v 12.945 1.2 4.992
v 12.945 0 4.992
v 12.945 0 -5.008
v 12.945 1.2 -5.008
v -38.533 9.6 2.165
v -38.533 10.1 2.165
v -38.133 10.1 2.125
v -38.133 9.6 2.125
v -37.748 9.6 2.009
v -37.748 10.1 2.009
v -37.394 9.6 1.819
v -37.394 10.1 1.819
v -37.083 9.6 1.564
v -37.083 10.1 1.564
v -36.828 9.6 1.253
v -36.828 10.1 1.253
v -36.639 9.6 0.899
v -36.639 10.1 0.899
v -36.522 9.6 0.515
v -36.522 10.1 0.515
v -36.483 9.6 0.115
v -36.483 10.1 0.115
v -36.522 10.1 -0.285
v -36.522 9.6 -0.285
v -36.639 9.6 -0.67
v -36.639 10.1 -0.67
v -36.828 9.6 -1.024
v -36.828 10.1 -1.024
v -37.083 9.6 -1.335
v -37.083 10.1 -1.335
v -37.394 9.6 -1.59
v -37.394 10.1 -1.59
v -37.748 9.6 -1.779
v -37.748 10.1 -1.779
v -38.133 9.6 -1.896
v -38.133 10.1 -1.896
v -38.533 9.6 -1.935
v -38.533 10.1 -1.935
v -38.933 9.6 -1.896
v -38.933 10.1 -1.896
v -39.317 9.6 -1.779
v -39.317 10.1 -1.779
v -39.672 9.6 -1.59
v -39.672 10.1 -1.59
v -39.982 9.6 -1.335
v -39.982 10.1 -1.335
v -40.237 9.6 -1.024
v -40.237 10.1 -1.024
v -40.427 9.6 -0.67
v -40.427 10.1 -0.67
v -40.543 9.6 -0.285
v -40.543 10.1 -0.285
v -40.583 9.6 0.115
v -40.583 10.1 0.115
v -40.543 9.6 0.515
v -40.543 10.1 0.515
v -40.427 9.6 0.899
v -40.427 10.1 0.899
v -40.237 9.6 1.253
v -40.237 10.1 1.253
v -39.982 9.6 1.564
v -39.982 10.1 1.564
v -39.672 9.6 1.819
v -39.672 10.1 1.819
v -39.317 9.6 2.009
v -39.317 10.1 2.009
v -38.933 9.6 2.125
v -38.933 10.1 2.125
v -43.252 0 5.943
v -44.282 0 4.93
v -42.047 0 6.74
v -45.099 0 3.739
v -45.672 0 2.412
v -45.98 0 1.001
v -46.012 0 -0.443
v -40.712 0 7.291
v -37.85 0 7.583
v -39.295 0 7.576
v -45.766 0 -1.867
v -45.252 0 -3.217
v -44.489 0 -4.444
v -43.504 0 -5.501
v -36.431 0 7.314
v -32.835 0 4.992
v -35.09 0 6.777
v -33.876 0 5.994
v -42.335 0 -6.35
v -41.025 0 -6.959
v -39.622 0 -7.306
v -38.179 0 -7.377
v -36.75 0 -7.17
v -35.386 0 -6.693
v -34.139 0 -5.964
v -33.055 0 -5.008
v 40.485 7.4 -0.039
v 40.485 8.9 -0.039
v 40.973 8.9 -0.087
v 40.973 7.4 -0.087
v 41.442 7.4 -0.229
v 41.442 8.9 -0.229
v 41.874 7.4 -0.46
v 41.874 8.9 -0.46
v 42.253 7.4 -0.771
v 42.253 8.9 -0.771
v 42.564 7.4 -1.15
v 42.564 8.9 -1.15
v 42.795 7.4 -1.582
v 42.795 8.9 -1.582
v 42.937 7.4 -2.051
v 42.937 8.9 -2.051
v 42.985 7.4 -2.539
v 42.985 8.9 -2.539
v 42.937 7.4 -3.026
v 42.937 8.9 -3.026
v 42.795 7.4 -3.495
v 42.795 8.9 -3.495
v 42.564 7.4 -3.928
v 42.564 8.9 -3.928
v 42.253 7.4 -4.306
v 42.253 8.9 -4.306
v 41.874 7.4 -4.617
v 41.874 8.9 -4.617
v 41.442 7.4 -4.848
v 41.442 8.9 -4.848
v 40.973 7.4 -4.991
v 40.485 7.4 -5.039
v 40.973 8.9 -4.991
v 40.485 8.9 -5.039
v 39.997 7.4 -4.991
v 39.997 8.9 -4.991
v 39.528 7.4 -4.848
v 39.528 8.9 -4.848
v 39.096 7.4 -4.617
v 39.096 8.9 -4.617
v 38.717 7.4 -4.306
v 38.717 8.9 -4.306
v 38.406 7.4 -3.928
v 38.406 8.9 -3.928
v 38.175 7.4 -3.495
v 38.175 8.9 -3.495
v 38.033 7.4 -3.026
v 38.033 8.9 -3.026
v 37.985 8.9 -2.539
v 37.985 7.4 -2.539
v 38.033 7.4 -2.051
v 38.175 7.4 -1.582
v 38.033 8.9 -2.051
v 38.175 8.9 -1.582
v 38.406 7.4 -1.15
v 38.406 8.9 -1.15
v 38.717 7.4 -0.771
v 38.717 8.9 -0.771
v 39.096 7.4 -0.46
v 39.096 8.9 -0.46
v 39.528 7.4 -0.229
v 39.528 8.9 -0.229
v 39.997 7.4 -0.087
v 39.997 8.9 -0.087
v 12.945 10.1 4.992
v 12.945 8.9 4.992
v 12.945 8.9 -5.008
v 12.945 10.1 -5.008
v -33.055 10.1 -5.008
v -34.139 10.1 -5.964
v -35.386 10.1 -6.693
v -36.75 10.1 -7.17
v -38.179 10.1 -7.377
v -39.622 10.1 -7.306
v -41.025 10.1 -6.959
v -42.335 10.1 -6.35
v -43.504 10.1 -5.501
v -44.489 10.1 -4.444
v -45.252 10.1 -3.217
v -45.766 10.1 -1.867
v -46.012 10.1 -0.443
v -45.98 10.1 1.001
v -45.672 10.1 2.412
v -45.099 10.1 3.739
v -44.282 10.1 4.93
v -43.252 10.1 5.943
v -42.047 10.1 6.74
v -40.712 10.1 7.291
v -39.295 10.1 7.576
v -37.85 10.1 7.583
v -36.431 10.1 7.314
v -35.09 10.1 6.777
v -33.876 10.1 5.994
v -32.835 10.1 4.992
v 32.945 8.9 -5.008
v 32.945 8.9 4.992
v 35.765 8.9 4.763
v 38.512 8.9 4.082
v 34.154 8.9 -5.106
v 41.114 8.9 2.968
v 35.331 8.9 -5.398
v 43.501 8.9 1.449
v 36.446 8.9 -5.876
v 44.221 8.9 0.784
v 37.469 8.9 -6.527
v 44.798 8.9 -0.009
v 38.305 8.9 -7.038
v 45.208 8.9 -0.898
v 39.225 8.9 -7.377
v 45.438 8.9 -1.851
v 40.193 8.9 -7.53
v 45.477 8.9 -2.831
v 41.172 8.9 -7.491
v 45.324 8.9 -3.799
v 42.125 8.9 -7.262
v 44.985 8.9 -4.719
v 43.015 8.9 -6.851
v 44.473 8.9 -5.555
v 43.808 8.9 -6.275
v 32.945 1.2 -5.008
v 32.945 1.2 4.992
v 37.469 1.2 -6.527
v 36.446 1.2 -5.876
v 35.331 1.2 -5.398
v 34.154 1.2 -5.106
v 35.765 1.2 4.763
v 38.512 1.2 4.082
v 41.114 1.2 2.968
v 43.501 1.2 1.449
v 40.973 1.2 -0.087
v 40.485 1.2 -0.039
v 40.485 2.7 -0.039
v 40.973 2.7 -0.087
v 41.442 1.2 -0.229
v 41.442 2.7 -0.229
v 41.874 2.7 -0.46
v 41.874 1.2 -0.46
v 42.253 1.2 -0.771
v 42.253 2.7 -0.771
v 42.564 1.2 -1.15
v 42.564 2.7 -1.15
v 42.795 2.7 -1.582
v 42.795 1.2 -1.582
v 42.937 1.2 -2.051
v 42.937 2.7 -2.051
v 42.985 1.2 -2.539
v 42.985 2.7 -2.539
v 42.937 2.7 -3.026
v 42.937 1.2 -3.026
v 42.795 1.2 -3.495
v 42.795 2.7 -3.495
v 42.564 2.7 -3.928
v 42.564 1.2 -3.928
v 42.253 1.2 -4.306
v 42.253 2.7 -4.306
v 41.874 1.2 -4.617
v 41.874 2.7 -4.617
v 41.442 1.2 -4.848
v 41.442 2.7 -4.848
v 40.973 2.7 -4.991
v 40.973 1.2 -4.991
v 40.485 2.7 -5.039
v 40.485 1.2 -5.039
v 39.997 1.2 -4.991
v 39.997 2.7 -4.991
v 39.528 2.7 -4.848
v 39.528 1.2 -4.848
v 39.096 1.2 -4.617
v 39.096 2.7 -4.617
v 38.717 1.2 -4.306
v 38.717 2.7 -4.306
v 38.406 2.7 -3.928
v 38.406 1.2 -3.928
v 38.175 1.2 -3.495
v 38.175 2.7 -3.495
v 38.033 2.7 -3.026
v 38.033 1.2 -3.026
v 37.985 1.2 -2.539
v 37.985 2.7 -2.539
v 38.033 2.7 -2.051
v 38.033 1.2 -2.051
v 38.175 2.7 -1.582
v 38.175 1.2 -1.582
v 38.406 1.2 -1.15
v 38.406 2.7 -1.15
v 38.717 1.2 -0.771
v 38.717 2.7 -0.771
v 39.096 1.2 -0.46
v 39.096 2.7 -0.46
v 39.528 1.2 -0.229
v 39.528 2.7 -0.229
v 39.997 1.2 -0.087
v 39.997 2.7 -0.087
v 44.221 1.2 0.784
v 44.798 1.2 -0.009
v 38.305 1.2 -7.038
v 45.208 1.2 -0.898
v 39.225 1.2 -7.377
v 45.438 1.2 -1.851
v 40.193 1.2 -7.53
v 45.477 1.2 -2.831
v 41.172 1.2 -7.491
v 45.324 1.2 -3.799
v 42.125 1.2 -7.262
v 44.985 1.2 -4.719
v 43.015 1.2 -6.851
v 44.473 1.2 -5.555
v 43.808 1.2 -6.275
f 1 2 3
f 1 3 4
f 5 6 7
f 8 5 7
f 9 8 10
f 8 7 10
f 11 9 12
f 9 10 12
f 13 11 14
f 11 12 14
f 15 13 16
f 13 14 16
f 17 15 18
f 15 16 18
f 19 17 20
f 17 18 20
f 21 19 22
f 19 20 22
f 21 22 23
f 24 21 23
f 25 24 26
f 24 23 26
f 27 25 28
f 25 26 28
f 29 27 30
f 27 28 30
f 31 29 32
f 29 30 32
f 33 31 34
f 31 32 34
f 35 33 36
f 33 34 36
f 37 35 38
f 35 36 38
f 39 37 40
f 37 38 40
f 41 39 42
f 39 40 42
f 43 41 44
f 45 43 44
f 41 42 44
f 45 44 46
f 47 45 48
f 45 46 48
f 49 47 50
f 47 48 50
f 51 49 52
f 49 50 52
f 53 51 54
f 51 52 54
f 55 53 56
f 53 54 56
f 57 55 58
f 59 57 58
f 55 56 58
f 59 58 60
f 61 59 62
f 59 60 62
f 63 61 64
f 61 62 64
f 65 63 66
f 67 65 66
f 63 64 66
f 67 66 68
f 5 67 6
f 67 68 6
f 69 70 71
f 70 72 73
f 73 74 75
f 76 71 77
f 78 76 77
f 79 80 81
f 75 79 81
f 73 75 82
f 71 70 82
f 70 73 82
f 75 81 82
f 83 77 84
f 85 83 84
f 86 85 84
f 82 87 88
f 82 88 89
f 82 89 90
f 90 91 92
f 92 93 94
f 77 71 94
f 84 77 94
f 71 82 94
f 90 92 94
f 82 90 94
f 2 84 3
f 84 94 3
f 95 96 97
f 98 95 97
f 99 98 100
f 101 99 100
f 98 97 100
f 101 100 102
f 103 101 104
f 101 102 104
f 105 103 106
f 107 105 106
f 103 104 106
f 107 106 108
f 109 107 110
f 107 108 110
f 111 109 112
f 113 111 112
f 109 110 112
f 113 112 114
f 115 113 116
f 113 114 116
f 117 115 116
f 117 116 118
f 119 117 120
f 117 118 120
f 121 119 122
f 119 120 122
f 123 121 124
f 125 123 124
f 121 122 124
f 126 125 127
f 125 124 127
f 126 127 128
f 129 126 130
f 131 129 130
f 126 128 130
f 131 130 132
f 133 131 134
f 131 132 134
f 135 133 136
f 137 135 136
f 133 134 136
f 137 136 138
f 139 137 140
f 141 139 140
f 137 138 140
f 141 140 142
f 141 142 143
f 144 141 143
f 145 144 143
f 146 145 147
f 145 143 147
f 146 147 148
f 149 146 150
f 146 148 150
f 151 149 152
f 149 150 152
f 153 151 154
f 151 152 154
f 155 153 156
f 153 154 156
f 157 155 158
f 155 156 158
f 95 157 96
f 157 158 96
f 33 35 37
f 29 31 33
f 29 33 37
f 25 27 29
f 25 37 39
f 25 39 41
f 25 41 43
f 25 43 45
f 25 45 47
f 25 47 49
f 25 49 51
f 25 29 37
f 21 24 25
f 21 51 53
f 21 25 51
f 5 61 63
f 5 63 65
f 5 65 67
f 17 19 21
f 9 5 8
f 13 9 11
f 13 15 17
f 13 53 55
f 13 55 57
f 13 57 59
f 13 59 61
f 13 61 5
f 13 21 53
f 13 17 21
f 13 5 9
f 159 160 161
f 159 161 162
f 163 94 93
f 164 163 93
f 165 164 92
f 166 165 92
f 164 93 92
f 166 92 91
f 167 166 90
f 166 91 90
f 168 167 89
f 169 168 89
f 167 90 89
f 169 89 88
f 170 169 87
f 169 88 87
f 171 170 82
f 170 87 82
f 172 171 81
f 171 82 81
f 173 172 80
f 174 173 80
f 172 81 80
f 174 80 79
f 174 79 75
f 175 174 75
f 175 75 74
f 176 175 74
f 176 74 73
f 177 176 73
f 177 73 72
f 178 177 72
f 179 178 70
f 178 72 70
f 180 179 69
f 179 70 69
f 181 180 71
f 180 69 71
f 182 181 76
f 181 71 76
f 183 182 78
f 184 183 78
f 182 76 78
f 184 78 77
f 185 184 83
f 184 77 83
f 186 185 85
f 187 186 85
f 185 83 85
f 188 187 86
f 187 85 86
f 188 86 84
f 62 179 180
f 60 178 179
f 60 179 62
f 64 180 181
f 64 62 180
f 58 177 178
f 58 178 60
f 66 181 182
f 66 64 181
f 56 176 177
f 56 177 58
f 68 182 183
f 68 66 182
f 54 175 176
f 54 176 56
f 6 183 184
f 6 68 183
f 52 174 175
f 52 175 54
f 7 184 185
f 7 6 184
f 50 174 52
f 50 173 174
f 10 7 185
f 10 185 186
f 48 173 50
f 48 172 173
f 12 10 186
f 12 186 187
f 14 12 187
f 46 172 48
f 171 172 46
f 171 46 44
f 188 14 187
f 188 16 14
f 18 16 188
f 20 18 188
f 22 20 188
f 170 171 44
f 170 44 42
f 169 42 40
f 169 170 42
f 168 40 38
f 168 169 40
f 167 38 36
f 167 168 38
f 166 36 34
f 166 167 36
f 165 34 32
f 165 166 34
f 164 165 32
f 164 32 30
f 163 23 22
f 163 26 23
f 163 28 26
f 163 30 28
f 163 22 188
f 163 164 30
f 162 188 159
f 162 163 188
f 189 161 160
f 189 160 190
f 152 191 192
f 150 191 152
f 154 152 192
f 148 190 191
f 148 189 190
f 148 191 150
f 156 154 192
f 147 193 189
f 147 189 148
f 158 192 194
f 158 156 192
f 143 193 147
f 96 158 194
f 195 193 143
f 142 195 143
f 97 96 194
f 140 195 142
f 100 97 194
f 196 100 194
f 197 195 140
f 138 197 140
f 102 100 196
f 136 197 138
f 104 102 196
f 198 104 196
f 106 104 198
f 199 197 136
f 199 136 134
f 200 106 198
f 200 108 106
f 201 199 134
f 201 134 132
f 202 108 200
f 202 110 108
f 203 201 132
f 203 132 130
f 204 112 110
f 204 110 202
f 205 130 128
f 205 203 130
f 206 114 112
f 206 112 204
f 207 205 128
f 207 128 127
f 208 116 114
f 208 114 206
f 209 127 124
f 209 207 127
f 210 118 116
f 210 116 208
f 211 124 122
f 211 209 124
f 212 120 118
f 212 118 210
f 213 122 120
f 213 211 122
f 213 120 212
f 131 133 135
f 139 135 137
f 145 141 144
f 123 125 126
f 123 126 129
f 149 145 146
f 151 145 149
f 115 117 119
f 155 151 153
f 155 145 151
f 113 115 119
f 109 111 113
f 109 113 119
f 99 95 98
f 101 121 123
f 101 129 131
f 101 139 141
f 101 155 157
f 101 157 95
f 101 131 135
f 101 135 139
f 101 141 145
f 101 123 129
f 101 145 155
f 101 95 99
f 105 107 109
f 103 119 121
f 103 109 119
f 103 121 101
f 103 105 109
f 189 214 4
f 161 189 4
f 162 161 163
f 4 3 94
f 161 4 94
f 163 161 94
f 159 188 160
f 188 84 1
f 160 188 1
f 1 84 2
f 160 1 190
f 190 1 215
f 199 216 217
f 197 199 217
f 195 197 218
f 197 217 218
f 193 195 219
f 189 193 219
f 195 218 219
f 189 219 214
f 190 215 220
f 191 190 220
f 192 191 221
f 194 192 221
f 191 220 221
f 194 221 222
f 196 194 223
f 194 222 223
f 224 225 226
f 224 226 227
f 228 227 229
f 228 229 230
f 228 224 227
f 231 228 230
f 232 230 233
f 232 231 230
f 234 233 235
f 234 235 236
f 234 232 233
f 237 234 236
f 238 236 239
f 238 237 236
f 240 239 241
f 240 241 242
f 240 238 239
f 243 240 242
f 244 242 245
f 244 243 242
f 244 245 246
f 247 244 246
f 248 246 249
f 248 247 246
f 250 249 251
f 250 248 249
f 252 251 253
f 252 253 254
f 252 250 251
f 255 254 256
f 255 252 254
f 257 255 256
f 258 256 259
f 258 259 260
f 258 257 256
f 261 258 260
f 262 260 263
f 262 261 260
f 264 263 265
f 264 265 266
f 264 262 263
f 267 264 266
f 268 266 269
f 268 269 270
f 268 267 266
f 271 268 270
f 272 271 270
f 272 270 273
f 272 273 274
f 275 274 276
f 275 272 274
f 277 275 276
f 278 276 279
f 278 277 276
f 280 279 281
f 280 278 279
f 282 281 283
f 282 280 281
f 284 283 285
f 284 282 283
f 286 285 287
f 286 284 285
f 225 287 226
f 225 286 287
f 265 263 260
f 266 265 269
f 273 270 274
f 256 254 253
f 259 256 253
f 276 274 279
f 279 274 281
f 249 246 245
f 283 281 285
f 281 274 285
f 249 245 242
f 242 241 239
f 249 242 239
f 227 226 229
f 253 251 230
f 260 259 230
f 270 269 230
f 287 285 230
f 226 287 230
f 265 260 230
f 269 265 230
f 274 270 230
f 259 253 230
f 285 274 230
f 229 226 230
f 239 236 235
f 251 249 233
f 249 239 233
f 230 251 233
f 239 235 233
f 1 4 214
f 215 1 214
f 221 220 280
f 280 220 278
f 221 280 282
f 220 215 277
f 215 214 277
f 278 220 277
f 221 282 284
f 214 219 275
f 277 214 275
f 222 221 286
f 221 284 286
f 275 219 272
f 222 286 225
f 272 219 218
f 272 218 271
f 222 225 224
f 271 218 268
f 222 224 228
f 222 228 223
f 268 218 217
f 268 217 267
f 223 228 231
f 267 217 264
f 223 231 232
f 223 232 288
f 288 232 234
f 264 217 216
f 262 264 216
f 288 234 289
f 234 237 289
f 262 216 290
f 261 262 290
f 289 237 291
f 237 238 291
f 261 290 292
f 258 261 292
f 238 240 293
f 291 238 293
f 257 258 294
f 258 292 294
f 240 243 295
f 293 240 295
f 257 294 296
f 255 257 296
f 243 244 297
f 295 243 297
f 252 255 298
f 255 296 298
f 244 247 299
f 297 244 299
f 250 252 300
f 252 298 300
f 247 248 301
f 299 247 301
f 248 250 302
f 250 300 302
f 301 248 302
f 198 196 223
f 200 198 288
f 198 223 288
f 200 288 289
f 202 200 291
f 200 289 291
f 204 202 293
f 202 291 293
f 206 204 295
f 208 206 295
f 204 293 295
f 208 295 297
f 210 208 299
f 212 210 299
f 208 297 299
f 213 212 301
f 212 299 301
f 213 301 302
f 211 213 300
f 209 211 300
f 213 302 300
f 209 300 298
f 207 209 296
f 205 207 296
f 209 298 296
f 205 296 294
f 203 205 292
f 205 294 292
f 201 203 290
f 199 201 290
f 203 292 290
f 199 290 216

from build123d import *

# Parameters (mm, degrees)
SALIENTE_EXTRUIR1_DEPTH = 10.1
CROQUIS7_R              = 2.05
CORTAR_EXTRUIR1_DEPTH   = 0.5
CROQUIS11_W             = 20
CROQUIS11_H             = 1.2
CORTAR_EXTRUIR4_DEPTH   = 49.726011614
SALIENTE_EXTRUIR2_START = -7.7
SALIENTE_EXTRUIR2_DEPTH = 7.7
CROQUIS15_R             = 2.5
CORTAR_EXTRUIR5_DEPTH   = 1.5


with BuildPart() as part:
    # Croquis1 → Saliente-Extruir1 (new body)
    with BuildSketch(Plane(origin=(0, 0, 0), x_dir=(1, 0, 0), z_dir=(0, 1, 0))):
        with BuildLine():
            Line((-32.835114186, -4.991653889), (32.944915669, -4.991653889))
            Line((32.944915669, -4.991653889), (32.944915669, 5.008346111))
            Line((32.944915669, 5.008346111), (-33.055084331, 5.008346111))
            ThreePointArc((-33.055084331, 5.008346111), (-46.031021583, -0.279505113), (-32.835114186, -4.991653889))
        make_face()
    extrude(amount=SALIENTE_EXTRUIR1_DEPTH)

    # Croquis7 → Cortar-Extruir1 (cut)
    with BuildSketch(Plane(origin=(0, 10.1, 0), x_dir=(1, 0, 0), z_dir=(0, 1, 0))):
        with Locations(Location((-38.532835433, -0.114567403, 0), (0, 0, 270))):
            Circle(CROQUIS7_R)
    extrude(amount=-CORTAR_EXTRUIR1_DEPTH, mode=Mode.SUBTRACT)

    # Croquis11 → Cortar-Extruir4 (cut, through all)
    with BuildSketch(Plane.XY.offset(4.991653889)):
        with Locations((22.944915669, 9.5)):
            Rectangle(CROQUIS11_W, CROQUIS11_H)
        with Locations((22.944915669, 0.6)):
            Rectangle(CROQUIS11_W, CROQUIS11_H)
    extrude(amount=-CORTAR_EXTRUIR4_DEPTH, mode=Mode.SUBTRACT)

    # Croquis14 → Saliente-Extruir2 (add)
    with BuildSketch(Plane(origin=(0, 8.9, 0), x_dir=(1, 0, 0), z_dir=(0, 1, 0)).offset(SALIENTE_EXTRUIR2_START)):
        with BuildLine():
            Line((32.944915669, 5.008346111), (32.944915669, -4.991653889))
            ThreePointArc((32.944915669, -4.991653889), (38.512321796, -4.082434131), (43.501214134, -1.449252634))
            ThreePointArc((43.501214134, -1.449252634), (44.473014214, 5.554717998), (37.469043582, 6.526518077))
            ThreePointArc((37.469043582, 6.526518077), (35.330946866, 5.398011722), (32.944915669, 5.008346111))
        make_face()
    extrude(amount=SALIENTE_EXTRUIR2_DEPTH)

    # Croquis15 → Cortar-Extruir5 (cut)
    with BuildSketch(Plane(origin=(0, 8.9, 0), x_dir=(1, 0, 0), z_dir=(0, 1, 0))):
        with Locations(Location((40.485128858, 2.538632722, 0), (0, 0, 270))):
            Circle(CROQUIS15_R)
    cortar_extruir5 = extrude(amount=-CORTAR_EXTRUIR5_DEPTH, mode=Mode.SUBTRACT)

    # Simetría1: Cortar-Extruir5 across plane
    add(cortar_extruir5.mirror(Plane.ZX.offset(5.05)), mode=Mode.SUBTRACT)


solid = part.part
